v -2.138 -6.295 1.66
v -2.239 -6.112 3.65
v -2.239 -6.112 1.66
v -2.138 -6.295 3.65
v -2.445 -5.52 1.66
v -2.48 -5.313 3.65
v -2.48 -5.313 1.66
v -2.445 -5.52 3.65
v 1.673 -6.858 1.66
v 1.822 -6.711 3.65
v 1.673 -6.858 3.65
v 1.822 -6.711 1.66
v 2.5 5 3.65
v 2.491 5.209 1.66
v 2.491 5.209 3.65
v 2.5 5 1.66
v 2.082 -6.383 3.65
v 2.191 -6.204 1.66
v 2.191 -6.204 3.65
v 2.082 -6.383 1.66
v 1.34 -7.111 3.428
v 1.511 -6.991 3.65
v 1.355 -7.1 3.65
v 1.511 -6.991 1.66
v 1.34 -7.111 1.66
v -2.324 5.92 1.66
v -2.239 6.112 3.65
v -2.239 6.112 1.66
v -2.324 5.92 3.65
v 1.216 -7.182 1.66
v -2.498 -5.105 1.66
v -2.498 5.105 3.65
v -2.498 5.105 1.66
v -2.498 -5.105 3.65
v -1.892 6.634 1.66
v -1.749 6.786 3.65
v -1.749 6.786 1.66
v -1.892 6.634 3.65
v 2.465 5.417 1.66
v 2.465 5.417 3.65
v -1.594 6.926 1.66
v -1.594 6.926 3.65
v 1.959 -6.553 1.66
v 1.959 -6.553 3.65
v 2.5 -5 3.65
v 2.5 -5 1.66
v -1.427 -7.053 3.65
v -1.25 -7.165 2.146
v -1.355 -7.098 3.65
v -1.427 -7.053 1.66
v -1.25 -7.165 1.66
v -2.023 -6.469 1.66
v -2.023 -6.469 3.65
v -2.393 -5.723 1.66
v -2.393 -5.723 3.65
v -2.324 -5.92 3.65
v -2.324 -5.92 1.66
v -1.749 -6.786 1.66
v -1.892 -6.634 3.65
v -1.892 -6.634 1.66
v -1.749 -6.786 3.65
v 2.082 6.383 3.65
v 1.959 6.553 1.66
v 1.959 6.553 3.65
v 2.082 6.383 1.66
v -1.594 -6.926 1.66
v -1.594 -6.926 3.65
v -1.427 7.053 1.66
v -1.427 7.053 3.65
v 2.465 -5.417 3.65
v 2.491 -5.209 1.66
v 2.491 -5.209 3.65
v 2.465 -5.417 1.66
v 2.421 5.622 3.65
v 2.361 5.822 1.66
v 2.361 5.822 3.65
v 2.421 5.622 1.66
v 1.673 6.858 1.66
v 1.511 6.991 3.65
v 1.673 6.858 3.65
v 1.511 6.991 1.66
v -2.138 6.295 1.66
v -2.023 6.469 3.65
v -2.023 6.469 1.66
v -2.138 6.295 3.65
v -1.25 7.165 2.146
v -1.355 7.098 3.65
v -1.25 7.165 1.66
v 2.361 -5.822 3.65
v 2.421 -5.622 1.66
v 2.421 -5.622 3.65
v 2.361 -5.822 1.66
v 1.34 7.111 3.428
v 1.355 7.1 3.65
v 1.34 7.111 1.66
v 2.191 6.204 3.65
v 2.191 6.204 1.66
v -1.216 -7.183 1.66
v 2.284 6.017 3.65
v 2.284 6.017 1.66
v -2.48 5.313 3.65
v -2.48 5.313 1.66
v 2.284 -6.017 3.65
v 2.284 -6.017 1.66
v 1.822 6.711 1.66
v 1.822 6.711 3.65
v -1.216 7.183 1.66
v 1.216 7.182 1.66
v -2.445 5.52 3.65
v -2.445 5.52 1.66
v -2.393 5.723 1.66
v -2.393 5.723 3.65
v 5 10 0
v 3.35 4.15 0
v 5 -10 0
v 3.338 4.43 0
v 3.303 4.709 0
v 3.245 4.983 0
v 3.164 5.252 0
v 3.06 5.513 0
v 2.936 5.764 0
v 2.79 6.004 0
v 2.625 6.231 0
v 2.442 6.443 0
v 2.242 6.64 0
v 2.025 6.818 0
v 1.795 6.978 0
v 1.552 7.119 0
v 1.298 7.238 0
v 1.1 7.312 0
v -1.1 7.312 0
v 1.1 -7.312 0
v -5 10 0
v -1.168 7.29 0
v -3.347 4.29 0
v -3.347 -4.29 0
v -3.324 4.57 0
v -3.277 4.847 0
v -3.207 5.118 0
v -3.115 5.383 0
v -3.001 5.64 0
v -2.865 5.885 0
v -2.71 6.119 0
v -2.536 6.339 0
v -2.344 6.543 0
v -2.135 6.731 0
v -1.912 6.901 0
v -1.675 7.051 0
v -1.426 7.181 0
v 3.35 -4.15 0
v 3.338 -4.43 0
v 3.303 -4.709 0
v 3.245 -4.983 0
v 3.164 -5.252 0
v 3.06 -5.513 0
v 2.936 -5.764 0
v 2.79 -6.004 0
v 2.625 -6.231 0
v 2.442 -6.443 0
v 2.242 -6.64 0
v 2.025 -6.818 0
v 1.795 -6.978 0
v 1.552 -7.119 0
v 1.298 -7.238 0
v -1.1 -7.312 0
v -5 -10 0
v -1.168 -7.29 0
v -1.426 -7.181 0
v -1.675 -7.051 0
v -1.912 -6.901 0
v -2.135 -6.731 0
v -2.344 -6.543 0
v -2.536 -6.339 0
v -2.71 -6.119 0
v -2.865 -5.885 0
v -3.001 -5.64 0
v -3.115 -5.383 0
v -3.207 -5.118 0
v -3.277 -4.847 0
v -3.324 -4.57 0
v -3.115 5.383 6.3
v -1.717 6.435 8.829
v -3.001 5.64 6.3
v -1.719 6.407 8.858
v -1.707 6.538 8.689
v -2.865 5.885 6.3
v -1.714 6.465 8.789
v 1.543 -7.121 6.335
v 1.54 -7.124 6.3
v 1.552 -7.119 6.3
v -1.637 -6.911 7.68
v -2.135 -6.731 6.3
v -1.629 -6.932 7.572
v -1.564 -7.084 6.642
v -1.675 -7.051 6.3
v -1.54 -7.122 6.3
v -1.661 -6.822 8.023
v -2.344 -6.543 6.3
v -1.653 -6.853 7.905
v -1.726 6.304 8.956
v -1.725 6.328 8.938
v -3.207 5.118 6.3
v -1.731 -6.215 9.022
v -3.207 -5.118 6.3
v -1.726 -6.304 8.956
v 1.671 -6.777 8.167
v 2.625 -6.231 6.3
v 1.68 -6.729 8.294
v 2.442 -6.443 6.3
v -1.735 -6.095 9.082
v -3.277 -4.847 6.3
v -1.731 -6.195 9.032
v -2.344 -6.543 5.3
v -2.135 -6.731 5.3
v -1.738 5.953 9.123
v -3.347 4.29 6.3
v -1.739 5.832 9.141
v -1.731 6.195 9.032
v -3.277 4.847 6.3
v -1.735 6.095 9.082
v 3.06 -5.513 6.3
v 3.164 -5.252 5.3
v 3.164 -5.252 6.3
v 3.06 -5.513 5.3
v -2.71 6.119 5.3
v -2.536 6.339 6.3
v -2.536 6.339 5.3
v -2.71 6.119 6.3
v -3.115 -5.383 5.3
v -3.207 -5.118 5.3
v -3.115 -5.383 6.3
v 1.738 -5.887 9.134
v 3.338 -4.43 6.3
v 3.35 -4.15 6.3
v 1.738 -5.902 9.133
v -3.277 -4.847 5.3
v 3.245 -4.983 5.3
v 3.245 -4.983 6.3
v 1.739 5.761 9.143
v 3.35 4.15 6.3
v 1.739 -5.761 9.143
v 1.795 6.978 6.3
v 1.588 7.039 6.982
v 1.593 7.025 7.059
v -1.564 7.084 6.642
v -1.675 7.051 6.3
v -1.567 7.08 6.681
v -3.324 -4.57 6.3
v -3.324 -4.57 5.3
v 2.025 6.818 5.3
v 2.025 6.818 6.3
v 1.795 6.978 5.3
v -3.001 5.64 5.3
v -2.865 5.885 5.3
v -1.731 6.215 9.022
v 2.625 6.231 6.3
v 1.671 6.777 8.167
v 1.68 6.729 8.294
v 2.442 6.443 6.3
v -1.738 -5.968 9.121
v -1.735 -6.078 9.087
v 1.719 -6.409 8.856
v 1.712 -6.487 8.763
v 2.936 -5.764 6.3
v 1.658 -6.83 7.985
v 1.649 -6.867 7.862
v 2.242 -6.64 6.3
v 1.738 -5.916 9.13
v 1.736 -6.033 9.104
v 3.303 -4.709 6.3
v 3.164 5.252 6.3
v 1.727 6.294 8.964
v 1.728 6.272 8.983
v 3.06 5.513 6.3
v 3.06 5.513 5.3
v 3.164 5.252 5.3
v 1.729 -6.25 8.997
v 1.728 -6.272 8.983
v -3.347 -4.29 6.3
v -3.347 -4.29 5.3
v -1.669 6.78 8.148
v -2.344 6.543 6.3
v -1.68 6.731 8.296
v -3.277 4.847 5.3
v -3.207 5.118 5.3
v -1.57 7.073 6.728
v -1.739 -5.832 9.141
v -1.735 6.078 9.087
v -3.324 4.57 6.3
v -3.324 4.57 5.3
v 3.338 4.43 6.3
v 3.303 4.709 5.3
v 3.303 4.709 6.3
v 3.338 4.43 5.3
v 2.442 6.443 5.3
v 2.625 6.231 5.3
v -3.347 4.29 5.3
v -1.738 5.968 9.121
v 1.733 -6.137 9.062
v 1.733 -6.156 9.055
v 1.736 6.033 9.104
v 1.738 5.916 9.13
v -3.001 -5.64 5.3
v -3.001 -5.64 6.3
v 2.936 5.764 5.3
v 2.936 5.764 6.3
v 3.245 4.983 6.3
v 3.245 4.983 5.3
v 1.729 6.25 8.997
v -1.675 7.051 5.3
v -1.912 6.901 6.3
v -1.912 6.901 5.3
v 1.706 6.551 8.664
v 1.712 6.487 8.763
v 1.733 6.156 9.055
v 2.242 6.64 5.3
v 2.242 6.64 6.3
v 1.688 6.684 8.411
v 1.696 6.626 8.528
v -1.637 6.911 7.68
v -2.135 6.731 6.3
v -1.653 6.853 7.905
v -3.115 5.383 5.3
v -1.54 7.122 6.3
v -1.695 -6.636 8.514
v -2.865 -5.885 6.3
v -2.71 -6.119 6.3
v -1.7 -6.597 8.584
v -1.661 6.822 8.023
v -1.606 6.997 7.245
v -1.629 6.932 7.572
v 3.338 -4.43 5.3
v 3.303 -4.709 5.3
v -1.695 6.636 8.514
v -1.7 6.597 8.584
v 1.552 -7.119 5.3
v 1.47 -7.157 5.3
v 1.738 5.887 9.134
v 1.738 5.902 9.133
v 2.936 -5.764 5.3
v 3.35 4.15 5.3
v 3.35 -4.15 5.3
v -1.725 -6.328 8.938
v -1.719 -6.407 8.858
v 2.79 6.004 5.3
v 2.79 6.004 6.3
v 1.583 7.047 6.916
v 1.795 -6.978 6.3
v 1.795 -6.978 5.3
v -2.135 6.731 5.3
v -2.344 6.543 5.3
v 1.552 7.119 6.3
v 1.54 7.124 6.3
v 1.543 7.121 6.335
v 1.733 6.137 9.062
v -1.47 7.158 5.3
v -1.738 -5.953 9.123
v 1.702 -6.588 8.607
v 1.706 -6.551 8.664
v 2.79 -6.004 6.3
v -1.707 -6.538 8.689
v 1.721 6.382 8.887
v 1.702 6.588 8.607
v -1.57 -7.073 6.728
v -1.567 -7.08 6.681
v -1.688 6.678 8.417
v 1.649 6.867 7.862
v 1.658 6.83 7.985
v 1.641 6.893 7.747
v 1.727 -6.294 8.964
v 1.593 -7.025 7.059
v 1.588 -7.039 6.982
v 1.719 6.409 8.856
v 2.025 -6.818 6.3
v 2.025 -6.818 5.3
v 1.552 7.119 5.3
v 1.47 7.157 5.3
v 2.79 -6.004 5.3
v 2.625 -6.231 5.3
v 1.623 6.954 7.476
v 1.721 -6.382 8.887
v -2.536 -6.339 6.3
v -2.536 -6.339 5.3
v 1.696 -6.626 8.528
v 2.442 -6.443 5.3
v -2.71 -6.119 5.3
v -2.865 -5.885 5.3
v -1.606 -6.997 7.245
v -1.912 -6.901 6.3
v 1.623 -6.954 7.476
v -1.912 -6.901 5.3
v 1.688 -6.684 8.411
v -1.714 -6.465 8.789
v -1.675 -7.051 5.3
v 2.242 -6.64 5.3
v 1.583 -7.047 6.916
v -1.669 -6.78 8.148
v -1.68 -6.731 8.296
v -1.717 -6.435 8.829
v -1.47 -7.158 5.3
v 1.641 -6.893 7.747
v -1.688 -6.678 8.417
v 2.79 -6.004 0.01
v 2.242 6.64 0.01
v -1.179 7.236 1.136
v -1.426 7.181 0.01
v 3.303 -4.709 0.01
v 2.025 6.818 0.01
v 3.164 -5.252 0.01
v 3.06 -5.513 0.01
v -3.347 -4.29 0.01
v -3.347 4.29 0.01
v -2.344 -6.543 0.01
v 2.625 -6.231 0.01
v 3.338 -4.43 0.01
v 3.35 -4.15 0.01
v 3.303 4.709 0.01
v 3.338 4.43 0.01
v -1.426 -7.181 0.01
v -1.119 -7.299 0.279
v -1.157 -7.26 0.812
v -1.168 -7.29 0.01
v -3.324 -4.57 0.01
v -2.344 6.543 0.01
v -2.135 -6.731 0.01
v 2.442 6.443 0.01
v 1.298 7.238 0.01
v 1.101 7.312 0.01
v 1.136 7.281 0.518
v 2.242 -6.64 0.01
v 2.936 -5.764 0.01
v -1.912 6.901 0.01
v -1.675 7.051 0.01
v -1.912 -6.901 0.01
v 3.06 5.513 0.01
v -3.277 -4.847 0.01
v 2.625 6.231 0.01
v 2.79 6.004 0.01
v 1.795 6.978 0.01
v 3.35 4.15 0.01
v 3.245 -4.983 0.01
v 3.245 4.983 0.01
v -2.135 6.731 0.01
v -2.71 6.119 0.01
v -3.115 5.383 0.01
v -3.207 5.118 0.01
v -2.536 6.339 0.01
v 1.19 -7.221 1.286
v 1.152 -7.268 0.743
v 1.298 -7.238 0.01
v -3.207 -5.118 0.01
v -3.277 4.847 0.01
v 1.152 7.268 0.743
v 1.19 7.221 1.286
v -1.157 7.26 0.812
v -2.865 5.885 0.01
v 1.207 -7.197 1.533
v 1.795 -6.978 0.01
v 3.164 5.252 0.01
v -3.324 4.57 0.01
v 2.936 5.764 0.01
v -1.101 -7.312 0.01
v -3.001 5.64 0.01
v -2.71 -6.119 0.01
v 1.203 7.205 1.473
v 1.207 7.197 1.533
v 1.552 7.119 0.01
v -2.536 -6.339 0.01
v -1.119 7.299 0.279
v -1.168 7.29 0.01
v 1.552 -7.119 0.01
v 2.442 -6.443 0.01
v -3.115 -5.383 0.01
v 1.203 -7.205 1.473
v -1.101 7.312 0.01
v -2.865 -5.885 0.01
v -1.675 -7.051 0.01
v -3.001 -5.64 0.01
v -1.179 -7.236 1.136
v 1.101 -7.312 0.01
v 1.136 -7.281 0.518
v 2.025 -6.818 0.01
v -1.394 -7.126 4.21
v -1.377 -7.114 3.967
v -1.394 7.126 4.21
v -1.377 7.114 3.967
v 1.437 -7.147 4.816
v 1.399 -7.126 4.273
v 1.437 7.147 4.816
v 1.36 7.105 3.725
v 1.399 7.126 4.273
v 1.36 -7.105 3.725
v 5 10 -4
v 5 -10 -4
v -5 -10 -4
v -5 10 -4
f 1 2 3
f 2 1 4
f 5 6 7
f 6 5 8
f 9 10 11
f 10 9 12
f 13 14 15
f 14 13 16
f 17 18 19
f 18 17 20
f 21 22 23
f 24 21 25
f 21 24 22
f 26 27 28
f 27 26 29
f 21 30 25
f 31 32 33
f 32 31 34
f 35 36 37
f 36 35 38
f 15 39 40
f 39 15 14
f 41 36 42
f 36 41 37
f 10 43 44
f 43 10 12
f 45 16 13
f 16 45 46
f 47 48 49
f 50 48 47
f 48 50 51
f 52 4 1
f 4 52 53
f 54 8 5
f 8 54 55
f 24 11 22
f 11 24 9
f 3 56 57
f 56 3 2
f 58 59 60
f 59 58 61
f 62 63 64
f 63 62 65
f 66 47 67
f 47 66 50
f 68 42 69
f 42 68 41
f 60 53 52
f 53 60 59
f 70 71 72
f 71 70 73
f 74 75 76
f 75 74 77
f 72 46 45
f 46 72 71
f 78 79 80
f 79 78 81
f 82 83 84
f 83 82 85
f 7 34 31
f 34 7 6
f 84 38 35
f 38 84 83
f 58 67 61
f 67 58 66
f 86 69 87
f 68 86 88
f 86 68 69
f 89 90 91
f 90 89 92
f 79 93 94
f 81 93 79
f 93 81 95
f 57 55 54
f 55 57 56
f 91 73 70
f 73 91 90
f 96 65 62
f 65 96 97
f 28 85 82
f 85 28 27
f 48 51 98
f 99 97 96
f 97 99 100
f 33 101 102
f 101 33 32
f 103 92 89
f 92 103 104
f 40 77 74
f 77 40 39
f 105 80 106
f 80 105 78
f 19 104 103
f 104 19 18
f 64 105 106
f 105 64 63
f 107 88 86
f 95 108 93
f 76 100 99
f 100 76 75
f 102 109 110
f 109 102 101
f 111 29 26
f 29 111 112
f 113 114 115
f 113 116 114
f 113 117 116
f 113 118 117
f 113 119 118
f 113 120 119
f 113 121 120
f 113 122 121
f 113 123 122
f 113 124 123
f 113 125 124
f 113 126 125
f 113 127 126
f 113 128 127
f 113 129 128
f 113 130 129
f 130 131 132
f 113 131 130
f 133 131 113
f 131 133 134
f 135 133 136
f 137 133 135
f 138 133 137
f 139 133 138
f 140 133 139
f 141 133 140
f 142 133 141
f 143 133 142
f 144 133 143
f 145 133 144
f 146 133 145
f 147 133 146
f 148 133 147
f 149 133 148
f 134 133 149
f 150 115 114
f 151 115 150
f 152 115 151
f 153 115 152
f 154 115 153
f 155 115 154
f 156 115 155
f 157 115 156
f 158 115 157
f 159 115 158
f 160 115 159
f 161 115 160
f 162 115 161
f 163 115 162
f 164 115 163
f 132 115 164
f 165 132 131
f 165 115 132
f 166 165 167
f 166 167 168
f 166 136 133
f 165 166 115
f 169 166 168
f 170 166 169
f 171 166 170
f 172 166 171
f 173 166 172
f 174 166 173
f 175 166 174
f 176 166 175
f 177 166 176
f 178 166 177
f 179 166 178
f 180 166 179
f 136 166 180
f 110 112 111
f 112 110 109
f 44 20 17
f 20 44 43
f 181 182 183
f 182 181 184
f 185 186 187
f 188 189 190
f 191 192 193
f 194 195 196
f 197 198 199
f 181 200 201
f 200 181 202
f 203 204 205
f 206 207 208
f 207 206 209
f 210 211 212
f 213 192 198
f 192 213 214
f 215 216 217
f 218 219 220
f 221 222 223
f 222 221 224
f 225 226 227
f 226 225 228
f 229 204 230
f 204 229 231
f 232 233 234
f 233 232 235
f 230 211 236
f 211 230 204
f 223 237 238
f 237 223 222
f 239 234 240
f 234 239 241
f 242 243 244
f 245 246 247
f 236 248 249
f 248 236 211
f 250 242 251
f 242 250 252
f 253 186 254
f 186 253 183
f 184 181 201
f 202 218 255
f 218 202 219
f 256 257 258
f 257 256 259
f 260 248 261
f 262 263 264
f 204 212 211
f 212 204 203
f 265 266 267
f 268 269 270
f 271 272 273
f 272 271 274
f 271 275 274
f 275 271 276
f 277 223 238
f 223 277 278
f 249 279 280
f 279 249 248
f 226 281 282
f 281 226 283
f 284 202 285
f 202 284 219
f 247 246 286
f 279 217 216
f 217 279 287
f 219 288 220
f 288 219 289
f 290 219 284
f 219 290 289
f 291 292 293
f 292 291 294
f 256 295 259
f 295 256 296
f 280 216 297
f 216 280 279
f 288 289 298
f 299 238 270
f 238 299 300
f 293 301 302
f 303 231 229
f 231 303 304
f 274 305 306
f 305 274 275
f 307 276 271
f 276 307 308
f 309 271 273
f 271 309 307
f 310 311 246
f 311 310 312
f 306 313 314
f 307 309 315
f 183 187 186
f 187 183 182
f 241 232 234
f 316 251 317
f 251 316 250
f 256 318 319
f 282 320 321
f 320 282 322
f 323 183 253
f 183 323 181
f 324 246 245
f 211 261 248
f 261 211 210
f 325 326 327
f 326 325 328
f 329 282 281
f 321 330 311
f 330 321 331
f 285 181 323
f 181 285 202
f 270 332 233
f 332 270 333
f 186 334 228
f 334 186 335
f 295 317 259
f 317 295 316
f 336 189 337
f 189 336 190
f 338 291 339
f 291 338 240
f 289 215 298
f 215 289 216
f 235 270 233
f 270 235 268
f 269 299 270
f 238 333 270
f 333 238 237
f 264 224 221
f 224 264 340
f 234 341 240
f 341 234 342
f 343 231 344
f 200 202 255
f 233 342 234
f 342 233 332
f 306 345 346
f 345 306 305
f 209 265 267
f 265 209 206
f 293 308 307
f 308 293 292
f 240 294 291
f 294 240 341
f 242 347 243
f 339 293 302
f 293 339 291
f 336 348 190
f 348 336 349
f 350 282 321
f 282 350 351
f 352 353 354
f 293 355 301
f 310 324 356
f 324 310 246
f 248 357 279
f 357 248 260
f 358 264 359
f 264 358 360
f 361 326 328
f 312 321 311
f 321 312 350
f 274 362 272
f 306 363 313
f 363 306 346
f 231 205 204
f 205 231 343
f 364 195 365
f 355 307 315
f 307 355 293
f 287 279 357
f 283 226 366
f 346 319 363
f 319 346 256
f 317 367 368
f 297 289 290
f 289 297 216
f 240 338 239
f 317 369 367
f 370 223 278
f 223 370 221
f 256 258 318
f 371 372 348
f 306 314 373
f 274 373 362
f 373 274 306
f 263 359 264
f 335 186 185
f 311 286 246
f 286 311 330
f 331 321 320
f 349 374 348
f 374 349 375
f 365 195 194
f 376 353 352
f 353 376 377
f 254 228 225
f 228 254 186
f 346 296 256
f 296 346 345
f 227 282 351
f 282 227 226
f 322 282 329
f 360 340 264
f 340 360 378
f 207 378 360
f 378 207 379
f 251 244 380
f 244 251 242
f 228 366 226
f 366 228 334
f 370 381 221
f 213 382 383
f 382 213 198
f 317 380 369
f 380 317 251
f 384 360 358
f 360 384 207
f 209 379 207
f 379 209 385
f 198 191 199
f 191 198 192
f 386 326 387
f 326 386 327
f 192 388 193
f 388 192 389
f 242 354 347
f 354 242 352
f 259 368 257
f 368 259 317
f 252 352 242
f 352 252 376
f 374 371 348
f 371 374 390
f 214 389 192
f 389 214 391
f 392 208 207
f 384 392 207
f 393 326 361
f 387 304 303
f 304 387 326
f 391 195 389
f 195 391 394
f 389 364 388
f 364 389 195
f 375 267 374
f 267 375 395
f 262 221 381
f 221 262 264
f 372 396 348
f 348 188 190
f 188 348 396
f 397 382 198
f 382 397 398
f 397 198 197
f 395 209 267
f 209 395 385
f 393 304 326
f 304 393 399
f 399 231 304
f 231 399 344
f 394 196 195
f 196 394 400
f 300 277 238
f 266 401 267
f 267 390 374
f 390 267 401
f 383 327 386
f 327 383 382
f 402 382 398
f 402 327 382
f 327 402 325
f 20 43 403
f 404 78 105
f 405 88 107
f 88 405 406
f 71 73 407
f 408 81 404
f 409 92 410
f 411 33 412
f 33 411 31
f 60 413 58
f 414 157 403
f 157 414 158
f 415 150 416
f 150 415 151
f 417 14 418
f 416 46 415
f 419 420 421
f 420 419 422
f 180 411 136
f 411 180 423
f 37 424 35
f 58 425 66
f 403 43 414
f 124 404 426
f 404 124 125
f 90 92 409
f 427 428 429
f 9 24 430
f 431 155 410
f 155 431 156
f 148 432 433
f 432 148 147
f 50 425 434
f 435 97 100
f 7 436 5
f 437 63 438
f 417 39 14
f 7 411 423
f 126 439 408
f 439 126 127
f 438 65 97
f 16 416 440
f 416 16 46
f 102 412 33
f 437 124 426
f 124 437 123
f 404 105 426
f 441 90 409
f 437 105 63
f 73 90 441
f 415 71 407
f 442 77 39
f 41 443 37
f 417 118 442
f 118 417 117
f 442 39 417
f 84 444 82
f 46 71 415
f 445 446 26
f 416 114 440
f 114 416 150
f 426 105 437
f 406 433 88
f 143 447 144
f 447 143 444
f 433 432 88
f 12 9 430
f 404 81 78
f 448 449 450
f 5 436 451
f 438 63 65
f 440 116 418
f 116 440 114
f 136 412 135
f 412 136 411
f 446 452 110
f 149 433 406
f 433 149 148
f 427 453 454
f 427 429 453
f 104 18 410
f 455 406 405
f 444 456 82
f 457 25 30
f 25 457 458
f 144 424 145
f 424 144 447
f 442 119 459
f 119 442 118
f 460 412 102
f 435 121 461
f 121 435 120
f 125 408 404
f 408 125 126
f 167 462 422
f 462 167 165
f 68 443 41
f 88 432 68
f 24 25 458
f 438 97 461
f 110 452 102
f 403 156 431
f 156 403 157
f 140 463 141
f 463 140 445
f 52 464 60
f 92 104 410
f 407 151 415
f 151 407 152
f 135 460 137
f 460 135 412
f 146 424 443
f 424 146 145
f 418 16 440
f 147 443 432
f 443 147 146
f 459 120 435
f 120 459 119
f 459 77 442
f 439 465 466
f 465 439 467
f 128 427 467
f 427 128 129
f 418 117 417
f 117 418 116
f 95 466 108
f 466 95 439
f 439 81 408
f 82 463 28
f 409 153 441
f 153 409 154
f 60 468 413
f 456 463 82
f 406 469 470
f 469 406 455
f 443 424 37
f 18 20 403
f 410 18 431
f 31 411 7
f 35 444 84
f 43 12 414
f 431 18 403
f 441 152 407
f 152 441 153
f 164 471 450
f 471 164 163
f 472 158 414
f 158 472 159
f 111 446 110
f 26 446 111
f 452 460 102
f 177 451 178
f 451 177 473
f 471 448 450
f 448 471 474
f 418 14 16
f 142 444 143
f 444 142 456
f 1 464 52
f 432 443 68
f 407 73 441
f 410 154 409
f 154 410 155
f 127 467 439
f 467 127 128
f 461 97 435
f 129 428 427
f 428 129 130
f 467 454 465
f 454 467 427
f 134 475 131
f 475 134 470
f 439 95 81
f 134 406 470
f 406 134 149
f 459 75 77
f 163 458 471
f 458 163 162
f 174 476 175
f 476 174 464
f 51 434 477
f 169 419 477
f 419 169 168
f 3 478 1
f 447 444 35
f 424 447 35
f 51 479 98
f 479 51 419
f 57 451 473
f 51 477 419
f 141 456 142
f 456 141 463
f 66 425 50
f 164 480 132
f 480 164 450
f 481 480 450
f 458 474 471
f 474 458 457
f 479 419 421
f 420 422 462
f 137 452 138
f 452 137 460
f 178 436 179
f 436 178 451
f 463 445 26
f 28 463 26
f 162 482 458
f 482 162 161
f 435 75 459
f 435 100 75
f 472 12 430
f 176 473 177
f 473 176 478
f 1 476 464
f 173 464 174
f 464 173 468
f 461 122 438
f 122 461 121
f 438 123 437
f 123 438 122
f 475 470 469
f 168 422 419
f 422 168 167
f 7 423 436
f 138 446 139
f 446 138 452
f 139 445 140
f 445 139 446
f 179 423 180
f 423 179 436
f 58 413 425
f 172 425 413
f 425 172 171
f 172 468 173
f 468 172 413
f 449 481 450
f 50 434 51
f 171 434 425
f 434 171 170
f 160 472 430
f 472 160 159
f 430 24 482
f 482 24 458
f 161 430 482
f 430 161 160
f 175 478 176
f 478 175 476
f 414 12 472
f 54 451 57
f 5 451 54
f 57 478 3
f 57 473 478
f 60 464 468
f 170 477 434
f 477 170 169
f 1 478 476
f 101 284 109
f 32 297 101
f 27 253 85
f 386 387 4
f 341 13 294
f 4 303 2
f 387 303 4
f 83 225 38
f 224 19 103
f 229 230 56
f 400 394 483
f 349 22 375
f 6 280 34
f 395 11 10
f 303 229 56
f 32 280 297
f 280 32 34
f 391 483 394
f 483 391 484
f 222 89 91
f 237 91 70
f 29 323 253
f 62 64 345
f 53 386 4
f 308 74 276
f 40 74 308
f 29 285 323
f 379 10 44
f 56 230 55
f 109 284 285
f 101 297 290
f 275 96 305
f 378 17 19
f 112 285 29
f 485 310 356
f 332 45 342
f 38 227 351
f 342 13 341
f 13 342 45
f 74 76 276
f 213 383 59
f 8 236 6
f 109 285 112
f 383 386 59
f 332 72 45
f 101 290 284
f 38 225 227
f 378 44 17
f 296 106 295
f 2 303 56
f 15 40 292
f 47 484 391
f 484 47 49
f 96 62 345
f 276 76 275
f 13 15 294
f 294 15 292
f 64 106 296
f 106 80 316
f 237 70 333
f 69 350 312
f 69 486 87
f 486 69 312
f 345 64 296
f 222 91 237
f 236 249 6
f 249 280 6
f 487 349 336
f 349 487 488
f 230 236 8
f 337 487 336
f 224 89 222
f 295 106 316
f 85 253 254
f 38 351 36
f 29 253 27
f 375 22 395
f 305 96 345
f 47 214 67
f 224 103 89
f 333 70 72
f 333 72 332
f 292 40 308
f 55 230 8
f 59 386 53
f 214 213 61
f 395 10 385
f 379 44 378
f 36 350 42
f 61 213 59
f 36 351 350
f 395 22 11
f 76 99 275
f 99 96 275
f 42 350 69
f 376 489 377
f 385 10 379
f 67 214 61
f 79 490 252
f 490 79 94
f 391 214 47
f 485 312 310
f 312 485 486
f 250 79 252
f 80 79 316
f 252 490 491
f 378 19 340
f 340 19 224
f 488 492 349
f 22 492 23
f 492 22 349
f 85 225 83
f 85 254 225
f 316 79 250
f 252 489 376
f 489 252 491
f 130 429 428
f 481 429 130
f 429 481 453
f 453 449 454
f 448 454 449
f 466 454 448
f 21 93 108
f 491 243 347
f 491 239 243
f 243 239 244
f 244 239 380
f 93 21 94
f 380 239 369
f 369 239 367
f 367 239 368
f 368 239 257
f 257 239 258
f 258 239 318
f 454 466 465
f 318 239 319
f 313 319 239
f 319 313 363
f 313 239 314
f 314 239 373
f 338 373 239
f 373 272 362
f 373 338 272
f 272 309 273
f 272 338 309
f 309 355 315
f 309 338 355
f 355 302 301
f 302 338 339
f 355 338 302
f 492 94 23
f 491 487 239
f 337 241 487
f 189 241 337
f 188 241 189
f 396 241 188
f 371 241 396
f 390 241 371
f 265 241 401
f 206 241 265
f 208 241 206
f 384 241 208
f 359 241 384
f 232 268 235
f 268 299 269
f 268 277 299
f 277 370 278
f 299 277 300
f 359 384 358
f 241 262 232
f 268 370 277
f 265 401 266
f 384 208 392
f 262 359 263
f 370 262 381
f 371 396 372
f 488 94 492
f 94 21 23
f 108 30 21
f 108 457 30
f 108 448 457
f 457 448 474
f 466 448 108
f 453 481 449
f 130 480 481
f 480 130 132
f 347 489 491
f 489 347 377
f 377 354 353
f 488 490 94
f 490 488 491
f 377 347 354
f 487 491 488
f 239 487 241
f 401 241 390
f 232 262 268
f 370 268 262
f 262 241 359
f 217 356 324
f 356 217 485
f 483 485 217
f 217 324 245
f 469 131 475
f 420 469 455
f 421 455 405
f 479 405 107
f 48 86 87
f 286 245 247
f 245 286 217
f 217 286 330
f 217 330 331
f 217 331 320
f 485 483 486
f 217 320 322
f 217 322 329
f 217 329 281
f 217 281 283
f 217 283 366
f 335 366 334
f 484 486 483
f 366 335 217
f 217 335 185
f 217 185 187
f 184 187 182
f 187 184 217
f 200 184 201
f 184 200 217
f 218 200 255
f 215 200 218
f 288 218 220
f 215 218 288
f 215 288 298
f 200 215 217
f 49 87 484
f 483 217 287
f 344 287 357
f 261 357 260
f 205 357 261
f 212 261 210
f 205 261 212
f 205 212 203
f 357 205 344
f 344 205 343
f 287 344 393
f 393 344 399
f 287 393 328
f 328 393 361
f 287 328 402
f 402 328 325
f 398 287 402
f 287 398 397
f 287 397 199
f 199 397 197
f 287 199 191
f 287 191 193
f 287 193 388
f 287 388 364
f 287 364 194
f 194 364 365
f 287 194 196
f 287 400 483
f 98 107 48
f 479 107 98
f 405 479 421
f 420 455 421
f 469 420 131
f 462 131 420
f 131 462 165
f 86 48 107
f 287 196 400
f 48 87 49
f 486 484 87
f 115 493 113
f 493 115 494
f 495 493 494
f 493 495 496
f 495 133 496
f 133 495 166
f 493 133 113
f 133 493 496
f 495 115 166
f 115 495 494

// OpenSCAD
$fn = $preview ? 25 : 75;

magic = 0.01;
clipX = 5;
clipY = 15;
clipH = 5.3; // i.e. IKEA plate thickness
clipToothR = .85;
clipToothH = 1.5;
clipSplit1 = 2.2;
clipSplit2 = 3.5;
clipZRound = 1.65;
clipTopExtra1 = 1;
clipTopExtra2 = 3;

// Sample:
translate([ -5, -10, -4 ])
cube([ 10, 20, 4 ]);
clip();

module clip() {
  color("Chocolate") // https://en.wikibooks.org/wiki/OpenSCAD_User_Manual/Transformations#color
  difference() {
    union() {
      clipLayer(clipH, 0); // main body
      hull() { // top extra
        translate([ 0, 0, clipH ]) clipLayer(clipTopExtra1);
        translate([ 0, 0, clipH + clipTopExtra1 ]) clipLayer(clipTopExtra2, -clipToothR);
      }
      hull() { // root
        translate([ 0, 0, 0 ]) clipLayer(magic);
        translate([ 0, 0, clipZRound ]) clipLayer(magic, 0);
      }
      hull() { // opposite
        translate([ 0, 0, clipH - clipZRound ]) clipLayer(magic, 0);
        translate([ 0, 0, clipH ]) clipLayer(magic);
      }
    }
    hull() { // split space
      translate([ clipSplit1 / -2, clipY / -2, 0 ])
      cube([ clipSplit1, clipY, magic ]);
      translate([ clipSplit2 / -2, clipY / -2, clipH + clipTopExtra1 + clipTopExtra2 ])
      cube([ clipSplit2, clipY, magic ]);
    }
  }
}

module clipLayer(layerH = clipH, extraX = clipToothR) {
  hull() {
    translate([ 0, (clipY - clipX) / 2 - extraX, 0 ])
    cylinder(d = clipX + extraX * 2, h = layerH);
    translate([ 0, (clipY - clipX) / -2 + extraX, 0 ])
    cylinder(d = clipX + extraX * 2, h = layerH);
  }
}
